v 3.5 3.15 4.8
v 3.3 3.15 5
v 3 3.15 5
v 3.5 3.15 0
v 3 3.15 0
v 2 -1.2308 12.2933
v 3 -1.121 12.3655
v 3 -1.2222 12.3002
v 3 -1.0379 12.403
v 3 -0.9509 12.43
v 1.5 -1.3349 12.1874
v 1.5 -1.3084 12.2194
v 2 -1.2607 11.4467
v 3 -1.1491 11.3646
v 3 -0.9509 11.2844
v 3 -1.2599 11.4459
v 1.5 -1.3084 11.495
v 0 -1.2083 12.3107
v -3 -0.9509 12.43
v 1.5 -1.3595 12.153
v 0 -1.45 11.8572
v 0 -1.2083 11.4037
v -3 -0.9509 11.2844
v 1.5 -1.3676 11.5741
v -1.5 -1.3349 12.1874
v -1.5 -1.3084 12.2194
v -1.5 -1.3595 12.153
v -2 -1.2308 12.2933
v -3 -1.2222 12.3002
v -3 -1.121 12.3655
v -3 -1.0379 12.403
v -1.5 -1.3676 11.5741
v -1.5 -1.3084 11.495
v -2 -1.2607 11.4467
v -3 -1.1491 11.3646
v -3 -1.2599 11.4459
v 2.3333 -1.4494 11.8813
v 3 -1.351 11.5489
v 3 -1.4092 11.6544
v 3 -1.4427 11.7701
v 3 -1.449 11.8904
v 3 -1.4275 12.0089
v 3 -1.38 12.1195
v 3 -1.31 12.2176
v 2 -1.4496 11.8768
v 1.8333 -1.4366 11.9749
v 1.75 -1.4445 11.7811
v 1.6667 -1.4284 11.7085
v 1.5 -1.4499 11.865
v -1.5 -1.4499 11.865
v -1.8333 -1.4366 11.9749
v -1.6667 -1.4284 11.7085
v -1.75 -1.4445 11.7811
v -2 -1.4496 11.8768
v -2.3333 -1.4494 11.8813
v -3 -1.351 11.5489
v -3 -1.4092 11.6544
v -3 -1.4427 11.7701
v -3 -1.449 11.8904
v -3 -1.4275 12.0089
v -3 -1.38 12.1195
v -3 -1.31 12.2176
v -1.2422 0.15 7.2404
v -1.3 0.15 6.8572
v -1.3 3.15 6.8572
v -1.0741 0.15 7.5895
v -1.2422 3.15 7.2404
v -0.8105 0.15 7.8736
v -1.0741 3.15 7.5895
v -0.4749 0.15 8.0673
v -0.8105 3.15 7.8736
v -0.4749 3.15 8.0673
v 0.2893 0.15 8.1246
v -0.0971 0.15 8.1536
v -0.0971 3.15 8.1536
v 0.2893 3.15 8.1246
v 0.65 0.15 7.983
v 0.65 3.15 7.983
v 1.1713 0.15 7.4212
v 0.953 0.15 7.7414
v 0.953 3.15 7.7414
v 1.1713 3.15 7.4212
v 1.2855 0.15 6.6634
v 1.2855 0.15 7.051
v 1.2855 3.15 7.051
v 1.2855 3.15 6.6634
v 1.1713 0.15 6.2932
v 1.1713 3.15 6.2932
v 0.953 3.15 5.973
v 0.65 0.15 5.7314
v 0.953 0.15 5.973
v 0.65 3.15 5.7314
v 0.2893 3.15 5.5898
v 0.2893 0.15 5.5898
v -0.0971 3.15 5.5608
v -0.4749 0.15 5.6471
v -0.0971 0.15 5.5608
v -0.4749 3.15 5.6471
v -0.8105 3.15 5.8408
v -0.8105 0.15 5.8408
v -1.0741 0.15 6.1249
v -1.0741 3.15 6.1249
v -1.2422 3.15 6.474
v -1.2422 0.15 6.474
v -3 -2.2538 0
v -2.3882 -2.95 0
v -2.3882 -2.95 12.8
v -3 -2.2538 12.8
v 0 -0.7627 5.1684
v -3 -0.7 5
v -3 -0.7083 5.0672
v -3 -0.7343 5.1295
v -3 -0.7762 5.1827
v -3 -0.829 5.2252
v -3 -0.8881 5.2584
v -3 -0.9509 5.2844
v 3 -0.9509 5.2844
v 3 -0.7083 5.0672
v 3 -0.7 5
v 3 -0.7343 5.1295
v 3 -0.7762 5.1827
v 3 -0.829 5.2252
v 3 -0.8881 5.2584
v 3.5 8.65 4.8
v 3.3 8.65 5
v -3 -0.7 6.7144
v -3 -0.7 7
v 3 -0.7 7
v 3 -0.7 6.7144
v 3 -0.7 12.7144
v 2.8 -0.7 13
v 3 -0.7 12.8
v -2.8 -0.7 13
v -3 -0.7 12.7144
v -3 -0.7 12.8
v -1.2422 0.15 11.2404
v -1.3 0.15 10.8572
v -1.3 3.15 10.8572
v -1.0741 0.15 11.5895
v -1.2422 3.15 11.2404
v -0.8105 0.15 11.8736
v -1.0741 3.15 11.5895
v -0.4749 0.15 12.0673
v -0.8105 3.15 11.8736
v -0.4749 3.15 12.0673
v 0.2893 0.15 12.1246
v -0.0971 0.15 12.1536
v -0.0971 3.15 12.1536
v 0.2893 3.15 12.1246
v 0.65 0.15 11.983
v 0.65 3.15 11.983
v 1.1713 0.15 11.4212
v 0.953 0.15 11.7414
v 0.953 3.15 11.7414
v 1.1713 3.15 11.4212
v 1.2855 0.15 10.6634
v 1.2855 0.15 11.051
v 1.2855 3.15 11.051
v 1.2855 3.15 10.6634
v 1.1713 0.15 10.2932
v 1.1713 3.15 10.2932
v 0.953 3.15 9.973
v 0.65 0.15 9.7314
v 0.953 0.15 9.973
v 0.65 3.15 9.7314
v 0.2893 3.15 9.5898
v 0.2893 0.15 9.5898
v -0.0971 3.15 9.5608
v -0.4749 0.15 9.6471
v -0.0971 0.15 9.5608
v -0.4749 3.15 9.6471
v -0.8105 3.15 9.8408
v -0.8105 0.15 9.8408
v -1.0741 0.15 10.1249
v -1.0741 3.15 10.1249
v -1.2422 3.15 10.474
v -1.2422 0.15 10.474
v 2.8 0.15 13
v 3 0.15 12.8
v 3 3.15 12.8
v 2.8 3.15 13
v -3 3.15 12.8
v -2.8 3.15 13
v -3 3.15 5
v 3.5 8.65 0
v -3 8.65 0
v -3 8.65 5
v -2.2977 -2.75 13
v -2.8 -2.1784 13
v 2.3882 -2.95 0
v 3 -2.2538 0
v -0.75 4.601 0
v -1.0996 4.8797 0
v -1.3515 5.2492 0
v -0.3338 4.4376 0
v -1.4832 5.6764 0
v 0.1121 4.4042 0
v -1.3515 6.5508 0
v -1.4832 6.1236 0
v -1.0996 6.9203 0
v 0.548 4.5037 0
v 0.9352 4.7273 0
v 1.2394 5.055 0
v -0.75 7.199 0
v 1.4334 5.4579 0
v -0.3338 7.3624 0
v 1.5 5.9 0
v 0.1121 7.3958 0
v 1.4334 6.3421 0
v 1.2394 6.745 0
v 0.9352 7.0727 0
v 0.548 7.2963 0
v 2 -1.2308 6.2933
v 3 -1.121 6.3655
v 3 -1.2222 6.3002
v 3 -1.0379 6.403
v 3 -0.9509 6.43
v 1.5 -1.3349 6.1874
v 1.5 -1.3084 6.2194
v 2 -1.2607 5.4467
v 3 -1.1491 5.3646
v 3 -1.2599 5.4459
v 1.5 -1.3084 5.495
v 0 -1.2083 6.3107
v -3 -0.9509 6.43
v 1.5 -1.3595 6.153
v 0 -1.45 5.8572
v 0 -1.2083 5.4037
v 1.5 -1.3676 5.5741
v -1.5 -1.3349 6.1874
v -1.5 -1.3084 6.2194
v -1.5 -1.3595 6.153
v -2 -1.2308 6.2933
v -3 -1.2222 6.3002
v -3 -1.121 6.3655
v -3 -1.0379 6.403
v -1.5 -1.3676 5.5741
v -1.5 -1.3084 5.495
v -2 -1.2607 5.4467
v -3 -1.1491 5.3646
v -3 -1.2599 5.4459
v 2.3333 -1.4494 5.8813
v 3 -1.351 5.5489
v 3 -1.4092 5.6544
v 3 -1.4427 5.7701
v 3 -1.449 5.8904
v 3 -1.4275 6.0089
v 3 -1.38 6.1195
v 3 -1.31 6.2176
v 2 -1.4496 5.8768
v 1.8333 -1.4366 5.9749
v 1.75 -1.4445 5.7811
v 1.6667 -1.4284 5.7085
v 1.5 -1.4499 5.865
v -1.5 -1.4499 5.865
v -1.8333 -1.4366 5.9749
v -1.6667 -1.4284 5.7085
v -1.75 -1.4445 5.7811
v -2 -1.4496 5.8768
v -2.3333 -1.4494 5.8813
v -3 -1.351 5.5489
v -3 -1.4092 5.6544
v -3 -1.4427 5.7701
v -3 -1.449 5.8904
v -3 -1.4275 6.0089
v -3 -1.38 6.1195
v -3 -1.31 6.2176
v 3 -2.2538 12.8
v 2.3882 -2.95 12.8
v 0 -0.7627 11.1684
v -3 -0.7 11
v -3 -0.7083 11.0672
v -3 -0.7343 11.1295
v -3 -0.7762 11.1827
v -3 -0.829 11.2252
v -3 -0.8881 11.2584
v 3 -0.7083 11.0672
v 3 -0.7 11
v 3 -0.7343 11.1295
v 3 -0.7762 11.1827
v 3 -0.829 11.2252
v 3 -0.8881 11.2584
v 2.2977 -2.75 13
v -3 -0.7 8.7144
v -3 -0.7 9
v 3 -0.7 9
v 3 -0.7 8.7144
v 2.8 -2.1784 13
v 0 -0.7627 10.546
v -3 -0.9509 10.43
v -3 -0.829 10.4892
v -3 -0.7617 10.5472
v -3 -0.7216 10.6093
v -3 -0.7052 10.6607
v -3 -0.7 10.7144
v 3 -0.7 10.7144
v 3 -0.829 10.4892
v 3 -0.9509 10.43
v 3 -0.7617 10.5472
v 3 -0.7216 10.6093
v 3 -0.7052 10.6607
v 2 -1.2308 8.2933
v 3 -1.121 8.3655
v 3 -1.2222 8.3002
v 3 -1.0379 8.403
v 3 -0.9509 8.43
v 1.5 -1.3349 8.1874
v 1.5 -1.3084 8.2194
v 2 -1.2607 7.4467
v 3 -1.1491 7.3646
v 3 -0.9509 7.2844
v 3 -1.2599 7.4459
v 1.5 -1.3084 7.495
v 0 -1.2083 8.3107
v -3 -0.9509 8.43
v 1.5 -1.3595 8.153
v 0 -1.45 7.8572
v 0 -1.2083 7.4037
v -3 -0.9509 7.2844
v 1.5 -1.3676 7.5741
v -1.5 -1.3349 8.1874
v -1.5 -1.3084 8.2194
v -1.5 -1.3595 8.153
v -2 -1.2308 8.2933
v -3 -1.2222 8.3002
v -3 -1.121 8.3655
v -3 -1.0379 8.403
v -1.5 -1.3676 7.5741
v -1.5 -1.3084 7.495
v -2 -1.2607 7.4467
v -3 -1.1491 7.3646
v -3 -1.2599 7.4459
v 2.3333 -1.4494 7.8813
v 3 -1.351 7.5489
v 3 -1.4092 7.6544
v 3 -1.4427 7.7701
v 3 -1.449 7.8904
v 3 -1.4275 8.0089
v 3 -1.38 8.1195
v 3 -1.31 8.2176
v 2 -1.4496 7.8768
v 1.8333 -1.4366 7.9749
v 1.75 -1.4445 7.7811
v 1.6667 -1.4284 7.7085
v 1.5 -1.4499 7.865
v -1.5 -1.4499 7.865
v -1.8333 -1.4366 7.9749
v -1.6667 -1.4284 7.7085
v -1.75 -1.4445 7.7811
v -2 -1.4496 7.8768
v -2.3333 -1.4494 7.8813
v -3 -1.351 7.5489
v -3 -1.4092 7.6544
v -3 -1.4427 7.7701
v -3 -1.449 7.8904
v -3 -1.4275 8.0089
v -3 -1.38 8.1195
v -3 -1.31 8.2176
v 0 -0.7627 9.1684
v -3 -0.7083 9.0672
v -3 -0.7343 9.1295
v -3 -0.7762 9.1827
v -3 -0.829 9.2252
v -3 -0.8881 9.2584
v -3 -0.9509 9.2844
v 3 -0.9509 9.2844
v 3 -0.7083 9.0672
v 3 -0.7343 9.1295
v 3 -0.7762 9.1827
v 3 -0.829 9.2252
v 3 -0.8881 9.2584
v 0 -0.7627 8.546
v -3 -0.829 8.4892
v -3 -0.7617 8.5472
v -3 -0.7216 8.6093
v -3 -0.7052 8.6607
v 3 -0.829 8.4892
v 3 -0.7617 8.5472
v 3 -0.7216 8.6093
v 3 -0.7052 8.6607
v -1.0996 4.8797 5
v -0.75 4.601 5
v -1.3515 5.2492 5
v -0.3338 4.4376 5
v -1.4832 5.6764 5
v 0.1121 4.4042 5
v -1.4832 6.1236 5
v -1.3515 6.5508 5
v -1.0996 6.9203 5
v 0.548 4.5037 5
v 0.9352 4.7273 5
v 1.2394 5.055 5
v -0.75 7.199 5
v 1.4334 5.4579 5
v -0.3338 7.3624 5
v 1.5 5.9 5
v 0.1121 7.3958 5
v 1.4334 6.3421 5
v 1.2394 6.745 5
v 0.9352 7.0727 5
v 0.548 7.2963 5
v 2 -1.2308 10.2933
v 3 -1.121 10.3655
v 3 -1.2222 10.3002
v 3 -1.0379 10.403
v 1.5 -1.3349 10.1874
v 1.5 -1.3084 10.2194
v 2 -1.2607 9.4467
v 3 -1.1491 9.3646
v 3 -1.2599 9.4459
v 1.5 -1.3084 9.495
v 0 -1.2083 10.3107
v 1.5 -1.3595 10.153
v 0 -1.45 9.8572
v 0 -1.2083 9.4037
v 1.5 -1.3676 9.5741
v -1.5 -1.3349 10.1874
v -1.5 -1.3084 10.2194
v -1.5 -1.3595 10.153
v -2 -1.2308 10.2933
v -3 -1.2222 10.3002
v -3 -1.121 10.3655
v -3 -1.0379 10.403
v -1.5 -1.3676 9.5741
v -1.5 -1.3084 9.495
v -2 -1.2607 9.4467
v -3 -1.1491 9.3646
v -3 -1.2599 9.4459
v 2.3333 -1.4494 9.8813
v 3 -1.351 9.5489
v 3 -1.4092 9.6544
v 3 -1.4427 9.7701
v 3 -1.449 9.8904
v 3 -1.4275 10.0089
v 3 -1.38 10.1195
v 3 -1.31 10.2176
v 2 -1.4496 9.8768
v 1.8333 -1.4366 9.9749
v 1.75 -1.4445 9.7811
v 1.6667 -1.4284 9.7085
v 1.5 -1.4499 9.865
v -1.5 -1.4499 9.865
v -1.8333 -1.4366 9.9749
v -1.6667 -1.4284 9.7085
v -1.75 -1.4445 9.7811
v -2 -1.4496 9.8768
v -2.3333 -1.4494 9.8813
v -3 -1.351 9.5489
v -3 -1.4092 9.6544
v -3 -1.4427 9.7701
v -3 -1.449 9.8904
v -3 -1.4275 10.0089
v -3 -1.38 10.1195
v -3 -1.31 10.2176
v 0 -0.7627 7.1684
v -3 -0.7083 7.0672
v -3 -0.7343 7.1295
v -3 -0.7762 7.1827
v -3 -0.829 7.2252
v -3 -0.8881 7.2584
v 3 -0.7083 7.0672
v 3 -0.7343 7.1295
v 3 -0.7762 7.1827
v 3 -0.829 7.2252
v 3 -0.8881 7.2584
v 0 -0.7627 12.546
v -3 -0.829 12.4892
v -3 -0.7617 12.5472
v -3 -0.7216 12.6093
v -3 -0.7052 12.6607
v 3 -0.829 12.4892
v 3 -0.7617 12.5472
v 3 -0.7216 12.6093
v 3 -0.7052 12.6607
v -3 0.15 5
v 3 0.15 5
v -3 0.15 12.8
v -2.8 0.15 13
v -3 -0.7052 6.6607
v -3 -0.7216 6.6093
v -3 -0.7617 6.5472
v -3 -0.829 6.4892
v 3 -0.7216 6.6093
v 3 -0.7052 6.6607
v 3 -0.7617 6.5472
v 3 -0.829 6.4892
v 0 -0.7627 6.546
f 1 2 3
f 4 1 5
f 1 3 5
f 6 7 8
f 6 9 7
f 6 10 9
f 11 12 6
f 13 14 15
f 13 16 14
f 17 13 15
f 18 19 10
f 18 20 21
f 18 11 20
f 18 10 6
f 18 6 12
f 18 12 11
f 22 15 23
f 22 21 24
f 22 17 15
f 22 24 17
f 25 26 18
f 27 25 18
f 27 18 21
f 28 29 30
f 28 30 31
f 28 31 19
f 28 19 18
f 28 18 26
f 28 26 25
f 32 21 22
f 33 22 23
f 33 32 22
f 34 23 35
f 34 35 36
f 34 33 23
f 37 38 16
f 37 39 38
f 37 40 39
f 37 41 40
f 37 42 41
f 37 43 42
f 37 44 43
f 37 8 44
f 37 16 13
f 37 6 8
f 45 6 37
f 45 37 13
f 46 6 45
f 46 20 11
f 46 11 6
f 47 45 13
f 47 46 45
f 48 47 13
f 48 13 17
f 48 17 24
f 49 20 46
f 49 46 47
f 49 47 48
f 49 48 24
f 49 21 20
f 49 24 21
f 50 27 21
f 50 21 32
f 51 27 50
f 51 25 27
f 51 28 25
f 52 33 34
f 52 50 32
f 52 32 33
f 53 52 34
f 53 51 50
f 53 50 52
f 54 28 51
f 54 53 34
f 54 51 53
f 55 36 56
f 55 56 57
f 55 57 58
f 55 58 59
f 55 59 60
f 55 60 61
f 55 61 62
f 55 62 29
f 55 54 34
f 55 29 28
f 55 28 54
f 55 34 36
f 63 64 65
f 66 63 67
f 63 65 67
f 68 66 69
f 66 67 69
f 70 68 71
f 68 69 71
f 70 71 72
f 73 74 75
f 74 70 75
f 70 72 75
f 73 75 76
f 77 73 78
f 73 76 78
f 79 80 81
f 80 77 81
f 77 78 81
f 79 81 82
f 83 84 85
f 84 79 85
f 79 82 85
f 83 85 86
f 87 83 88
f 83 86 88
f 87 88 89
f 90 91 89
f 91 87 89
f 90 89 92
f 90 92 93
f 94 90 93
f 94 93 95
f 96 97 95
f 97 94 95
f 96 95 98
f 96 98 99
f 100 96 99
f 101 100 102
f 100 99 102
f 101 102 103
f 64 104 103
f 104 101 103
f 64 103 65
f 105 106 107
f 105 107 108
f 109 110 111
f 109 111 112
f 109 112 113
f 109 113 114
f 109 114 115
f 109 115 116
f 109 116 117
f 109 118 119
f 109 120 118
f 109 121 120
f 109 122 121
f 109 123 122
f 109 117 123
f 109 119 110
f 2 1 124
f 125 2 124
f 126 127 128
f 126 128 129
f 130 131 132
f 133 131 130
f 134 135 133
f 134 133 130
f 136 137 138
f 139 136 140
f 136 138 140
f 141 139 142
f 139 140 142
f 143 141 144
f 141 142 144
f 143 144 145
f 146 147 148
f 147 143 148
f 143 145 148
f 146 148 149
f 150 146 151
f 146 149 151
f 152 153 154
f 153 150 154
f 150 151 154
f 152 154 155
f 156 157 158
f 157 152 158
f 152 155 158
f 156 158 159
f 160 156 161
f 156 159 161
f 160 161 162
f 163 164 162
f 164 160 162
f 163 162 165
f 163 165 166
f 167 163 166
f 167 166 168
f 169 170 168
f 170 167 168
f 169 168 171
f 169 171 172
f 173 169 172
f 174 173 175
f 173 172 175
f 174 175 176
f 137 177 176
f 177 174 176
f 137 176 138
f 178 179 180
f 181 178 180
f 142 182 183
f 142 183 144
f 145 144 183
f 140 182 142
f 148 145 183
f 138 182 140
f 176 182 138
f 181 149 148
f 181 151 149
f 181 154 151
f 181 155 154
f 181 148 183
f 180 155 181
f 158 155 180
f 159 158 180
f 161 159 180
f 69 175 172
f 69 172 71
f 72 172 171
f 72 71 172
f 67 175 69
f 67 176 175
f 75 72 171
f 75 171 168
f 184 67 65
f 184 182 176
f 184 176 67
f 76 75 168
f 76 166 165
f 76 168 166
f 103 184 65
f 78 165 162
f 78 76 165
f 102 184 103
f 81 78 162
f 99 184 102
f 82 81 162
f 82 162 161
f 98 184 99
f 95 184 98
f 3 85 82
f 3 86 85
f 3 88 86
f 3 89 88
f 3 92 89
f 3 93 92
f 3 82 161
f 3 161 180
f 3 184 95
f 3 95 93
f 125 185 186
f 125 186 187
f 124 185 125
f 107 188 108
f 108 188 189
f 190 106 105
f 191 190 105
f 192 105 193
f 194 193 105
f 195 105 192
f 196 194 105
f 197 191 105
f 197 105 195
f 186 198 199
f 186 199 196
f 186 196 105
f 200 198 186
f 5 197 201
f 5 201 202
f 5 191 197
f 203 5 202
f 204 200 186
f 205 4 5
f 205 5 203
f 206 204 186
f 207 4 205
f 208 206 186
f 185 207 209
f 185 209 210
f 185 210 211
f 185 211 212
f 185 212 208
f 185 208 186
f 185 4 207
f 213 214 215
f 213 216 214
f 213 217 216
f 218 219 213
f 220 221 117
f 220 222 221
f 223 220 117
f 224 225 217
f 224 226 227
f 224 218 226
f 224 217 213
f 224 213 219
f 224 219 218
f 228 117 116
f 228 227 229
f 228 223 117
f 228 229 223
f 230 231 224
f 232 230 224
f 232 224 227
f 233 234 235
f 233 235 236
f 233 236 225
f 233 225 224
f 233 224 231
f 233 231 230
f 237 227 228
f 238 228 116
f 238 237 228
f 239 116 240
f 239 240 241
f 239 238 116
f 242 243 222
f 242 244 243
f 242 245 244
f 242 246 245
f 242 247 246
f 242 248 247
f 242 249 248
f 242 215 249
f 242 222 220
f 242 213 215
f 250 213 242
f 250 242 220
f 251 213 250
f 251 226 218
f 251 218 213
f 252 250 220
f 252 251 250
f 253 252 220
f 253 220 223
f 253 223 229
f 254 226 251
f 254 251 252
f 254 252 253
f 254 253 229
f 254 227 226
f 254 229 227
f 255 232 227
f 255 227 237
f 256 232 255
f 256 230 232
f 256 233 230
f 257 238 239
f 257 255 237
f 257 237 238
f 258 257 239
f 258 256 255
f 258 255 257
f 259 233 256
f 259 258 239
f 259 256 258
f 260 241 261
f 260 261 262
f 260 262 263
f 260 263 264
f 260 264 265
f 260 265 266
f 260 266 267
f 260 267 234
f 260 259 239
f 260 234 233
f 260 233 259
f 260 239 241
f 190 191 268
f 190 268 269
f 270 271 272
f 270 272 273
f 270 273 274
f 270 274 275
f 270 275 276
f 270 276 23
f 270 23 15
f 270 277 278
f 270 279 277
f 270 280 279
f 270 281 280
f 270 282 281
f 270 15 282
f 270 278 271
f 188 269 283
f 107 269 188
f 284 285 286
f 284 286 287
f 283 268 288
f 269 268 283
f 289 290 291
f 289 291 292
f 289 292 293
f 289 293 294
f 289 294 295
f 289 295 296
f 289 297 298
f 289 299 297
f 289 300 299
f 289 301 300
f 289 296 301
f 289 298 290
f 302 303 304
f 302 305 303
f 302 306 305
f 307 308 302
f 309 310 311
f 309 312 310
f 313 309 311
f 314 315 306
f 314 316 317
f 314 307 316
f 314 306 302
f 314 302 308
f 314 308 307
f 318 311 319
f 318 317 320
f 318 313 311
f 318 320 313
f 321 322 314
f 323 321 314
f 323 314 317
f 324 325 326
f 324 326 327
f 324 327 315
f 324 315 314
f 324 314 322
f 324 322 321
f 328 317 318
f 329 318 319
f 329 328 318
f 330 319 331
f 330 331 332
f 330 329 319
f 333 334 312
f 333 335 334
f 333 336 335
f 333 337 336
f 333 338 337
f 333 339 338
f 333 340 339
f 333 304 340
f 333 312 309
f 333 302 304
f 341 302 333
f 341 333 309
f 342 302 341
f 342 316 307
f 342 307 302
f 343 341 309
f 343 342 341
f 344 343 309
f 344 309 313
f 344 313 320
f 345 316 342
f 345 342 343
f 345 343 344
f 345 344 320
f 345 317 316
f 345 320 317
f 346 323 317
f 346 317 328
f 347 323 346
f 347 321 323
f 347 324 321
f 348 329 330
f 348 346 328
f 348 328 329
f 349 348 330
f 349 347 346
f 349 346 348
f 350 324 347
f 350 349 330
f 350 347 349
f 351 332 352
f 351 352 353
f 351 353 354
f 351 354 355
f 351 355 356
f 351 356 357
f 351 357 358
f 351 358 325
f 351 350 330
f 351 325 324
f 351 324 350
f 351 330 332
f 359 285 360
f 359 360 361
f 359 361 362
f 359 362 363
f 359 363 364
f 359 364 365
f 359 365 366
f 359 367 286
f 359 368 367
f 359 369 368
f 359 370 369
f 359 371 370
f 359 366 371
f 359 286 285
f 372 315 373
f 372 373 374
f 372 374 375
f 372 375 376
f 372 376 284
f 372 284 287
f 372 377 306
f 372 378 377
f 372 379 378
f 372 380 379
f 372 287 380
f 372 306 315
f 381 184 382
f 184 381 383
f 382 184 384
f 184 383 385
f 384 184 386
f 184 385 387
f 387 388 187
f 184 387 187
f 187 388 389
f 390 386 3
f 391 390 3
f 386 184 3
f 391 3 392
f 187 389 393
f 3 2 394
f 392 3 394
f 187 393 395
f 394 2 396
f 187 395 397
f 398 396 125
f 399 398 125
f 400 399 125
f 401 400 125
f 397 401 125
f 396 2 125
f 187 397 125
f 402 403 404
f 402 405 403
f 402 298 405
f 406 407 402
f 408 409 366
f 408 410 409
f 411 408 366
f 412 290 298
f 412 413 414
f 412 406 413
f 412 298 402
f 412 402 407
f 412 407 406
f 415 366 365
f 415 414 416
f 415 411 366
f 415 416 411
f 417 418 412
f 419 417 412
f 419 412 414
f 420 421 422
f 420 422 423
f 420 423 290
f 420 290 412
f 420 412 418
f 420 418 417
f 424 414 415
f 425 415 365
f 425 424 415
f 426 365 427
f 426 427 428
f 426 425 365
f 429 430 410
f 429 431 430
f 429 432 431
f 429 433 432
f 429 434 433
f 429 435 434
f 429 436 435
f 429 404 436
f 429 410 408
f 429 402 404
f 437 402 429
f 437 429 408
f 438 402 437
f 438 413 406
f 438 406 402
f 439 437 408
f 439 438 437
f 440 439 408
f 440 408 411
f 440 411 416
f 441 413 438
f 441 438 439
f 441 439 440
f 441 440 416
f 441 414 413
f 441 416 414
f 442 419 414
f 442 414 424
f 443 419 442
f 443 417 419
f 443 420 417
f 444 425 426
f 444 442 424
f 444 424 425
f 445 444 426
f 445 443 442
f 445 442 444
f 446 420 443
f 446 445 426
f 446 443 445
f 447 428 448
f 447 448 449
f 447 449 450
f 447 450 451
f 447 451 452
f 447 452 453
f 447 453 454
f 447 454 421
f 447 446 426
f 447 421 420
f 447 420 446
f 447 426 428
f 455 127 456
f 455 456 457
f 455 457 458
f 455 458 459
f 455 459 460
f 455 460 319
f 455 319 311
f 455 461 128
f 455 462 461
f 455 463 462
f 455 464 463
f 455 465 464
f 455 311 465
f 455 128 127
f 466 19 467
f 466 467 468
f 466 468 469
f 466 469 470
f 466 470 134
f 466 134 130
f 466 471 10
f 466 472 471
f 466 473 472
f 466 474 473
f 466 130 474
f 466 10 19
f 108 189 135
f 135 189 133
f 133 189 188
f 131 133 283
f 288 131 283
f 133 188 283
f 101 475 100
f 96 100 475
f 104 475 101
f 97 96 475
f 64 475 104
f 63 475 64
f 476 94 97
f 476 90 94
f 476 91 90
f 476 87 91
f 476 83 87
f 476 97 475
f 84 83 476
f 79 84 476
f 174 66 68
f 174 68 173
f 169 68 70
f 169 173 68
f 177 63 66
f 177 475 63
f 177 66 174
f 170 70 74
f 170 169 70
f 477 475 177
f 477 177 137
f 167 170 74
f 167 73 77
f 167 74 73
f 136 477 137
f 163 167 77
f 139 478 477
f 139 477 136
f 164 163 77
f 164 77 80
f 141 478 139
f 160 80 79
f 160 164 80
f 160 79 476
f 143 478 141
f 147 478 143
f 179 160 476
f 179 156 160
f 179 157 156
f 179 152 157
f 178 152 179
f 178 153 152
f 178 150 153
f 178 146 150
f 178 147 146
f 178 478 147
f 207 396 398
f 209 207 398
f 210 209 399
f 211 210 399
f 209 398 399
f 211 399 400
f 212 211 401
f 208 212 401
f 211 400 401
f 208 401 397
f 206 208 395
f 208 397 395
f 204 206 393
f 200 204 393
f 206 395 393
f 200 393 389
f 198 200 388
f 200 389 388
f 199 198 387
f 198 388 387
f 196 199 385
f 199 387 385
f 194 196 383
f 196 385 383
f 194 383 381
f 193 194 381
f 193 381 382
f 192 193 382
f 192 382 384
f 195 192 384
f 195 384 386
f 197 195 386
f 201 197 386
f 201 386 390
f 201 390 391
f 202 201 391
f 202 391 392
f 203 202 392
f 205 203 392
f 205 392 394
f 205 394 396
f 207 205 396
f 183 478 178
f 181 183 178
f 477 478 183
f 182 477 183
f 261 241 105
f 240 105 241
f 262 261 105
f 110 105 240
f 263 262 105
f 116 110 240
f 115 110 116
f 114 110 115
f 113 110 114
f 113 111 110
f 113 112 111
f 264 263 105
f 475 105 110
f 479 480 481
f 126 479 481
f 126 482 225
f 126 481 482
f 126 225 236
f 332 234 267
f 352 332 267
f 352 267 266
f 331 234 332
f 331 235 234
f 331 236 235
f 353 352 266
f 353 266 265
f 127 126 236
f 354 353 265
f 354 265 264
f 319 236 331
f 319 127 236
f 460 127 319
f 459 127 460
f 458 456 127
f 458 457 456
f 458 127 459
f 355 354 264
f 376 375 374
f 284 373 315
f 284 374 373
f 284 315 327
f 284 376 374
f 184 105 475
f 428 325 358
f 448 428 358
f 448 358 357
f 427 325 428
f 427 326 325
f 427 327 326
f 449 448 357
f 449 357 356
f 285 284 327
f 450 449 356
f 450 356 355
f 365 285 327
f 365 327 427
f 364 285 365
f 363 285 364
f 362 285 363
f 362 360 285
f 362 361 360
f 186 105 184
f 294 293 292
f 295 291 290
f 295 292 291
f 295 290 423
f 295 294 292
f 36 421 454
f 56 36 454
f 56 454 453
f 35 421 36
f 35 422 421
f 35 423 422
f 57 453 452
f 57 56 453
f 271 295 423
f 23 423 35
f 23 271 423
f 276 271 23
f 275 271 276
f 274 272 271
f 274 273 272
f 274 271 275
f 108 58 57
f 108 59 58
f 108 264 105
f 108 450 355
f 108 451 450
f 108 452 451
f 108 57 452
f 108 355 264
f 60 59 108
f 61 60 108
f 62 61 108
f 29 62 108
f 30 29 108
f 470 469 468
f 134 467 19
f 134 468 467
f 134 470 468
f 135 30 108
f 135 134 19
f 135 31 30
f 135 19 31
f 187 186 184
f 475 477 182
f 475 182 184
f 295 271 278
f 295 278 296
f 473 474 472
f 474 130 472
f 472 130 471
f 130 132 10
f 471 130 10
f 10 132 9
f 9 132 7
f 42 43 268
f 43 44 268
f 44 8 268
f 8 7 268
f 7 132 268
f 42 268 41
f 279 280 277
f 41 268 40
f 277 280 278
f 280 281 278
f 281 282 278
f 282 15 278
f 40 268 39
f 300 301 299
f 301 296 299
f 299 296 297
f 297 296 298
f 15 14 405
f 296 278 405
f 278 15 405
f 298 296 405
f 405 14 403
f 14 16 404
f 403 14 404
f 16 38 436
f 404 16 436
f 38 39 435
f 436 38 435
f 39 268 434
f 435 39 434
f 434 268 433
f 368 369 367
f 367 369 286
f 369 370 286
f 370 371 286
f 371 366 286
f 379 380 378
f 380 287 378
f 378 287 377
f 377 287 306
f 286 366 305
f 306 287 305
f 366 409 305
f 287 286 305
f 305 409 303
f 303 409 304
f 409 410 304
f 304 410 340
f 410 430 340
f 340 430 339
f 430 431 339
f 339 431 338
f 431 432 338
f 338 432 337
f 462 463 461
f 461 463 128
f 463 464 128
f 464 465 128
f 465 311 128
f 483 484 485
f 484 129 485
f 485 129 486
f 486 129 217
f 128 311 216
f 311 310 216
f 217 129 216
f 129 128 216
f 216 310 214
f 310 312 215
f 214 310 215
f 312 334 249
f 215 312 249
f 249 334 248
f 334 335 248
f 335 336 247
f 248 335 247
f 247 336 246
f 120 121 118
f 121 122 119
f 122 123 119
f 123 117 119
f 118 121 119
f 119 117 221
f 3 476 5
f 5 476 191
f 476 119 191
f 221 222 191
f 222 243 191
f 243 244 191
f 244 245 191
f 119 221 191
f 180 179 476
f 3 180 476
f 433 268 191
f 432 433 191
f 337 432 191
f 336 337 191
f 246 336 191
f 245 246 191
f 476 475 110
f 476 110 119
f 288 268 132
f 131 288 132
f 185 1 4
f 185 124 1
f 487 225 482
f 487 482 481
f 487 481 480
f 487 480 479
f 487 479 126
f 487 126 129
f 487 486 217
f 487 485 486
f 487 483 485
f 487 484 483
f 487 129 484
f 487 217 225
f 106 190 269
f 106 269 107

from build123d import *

# Parameters (mm, degrees)
BOSS_EXTRUDE1_DEPTH     = 13
SKETCH6_W               = 6
SKETCH6_H               = 5
BOSS_EXTRUDE4_DEPTH     = 5.6
SKETCH16_W              = 6
SKETCH16_H              = 8
BOSS_EXTRUDE5_DEPTH     = 0.1
CUT_EXTRUDE6_DEPTH      = 4
CUT_EXTRUDE6_DEPTH_BACK = 3.6
SKETCH15_R              = 1.3
CUT_EXTRUDE7_DEPTH      = 8.7202
CUT_EXTRUDE8_START      = -0.2202
SKETCH19_W              = 6
SKETCH19_H              = 8
SKETCH19_R              = 1.3
CUT_EXTRUDE8_DEPTH      = 0.2202
SKETCH12_R              = 1.5
CUT_EXTRUDE5_DEPTH      = 6
CHAMFER1_SIZE           = 0.2
SKETCH20_W              = 5
SKETCH20_H              = 5.5
BOSS_EXTRUDE6_DEPTH     = 0.5
SKETCH21_W              = 5
SKETCH21_H              = 5.5
BOSS_EXTRUDE7_DEPTH     = 0.5
CHAMFER2_SIZE           = 0.2
CROQUIS1_W              = 5
CROQUIS1_H              = 5.5
CORTAR_EXTRUIR1_DEPTH   = 0.5


with BuildPart() as part:
    # Sketch1 → Boss-Extrude1 (new body)
    with BuildSketch(Plane.XY):
        Polygon((3, 3.05), (3, -2.253801214), (2.388188946, -2.95), (-2.388188946, -2.95), (-3, -2.253801214), (-3, 3.05), align=None)
    extrude(amount=BOSS_EXTRUDE1_DEPTH)

    # Sketch6 → Boss-Extrude4 (add)
    with BuildSketch(Plane(origin=(0, 3.05, 0), x_dir=(1, 0, 0), z_dir=(0, 1, 0))):
        with Locations((0, -2.5)):
            Rectangle(SKETCH6_W, SKETCH6_H)
    extrude(amount=BOSS_EXTRUDE4_DEPTH)

    # Sketch16 → Boss-Extrude5 (add)
    with BuildSketch(Plane(origin=(0, 3.05, 0), x_dir=(1, 0, 0), z_dir=(0, 1, 0))):
        with Locations((0, -9)):
            Rectangle(SKETCH16_W, SKETCH16_H)
    extrude(amount=BOSS_EXTRUDE5_DEPTH)

    # Sketch18 → Cut-Extrude6 (cut, two sides: drawn at the far end of the back side and taken through both)
    with BuildSketch(Plane(origin=(0, 0, 0), x_dir=(0, 0, -1), z_dir=(1, 0, 0)).offset(-CUT_EXTRUDE6_DEPTH_BACK)):
        with BuildLine():
            Line((-8.8572, -0.0702), (-12.8572, -0.0702))
            Line((-12.8572, -0.0702), (-13, -0.0702))
            Line((-13, -0.0702), (-13, -0.7))
            Line((-13, -0.7), (-12.8572, -0.7))
            Line((-12.8572, -0.7), (-12.7144, -0.7))
            add(Edge.make_bspline(
                [(-12.7144, -0.7), (-12.5198, -0.7), (-12.43, -0.9509)],
                knots=[0.103448276, 0.103448276, 0.103448276, 0.137931034, 0.137931034, 0.137931034], degree=2))
            add(Edge.make_bspline(
                [(-12.43, -0.9509), (-12.3594, -1.2388), (-12.13, -1.45), (-11.8572, -1.45)],
                knots=[0.137931034, 0.137931034, 0.137931034, 0.137931034, 0.172413793, 0.172413793, 0.172413793, 0.172413793], degree=3))
            add(Edge.make_bspline(
                [(-11.8572, -1.45), (-11.5844, -1.45), (-11.355, -1.2388), (-11.2844, -0.9509)],
                knots=[0.172413793, 0.172413793, 0.172413793, 0.172413793, 0.206896552, 0.206896552, 0.206896552, 0.206896552], degree=3))
            add(Edge.make_bspline(
                [(-11.2844, -0.9509), (-11.1946, -0.7), (-11, -0.7)],
                knots=[0.206896552, 0.206896552, 0.206896552, 0.24137931, 0.24137931, 0.24137931], degree=2))
            Line((-11, -0.7), (-10.8572, -0.7))
            Line((-10.8572, -0.7), (-10.7144, -0.7))
            add(Edge.make_bspline(
                [(-10.7144, -0.7), (-10.5198, -0.7), (-10.43, -0.9509)],
                knots=[0.310344828, 0.310344828, 0.310344828, 0.344827586, 0.344827586, 0.344827586], degree=2))
            add(Edge.make_bspline(
                [(-10.43, -0.9509), (-10.3594, -1.2388), (-10.13, -1.45), (-9.8572, -1.45)],
                knots=[0.344827586, 0.344827586, 0.344827586, 0.344827586, 0.379310345, 0.379310345, 0.379310345, 0.379310345], degree=3))
            add(Edge.make_bspline(
                [(-9.8572, -1.45), (-9.5844, -1.45), (-9.355, -1.2388), (-9.2844, -0.9509)],
                knots=[0.379310345, 0.379310345, 0.379310345, 0.379310345, 0.413793103, 0.413793103, 0.413793103, 0.413793103], degree=3))
            add(Edge.make_bspline(
                [(-9.2844, -0.9509), (-9.1946, -0.7), (-9, -0.7)],
                knots=[0.413793103, 0.413793103, 0.413793103, 0.448275862, 0.448275862, 0.448275862], degree=2))
            Line((-9, -0.7), (-8.8572, -0.7))
            Line((-8.8572, -0.7), (-8.7144, -0.7))
            add(Edge.make_bspline(
                [(-8.7144, -0.7), (-8.5198, -0.7), (-8.43, -0.9509)],
                knots=[0.517241379, 0.517241379, 0.517241379, 0.551724138, 0.551724138, 0.551724138], degree=2))
            add(Edge.make_bspline(
                [(-8.43, -0.9509), (-8.3594, -1.2388), (-8.13, -1.45), (-7.8572, -1.45)],
                knots=[0.551724138, 0.551724138, 0.551724138, 0.551724138, 0.586206897, 0.586206897, 0.586206897, 0.586206897], degree=3))
            add(Edge.make_bspline(
                [(-7.8572, -1.45), (-7.5844, -1.45), (-7.355, -1.2388), (-7.2844, -0.9509)],
                knots=[0.586206897, 0.586206897, 0.586206897, 0.586206897, 0.620689655, 0.620689655, 0.620689655, 0.620689655], degree=3))
            add(Edge.make_bspline(
                [(-7.2844, -0.9509), (-7.1946, -0.7), (-7, -0.7)],
                knots=[0.620689655, 0.620689655, 0.620689655, 0.655172414, 0.655172414, 0.655172414], degree=2))
            Line((-7, -0.7), (-6.8572, -0.7))
            Line((-6.8572, -0.7), (-6.7144, -0.7))
            add(Edge.make_bspline(
                [(-6.7144, -0.7), (-6.5198, -0.7), (-6.43, -0.9509)],
                knots=[0.724137931, 0.724137931, 0.724137931, 0.75862069, 0.75862069, 0.75862069], degree=2))
            add(Edge.make_bspline(
                [(-6.43, -0.9509), (-6.3594, -1.2388), (-6.13, -1.45), (-5.8572, -1.45)],
                knots=[0.75862069, 0.75862069, 0.75862069, 0.75862069, 0.793103448, 0.793103448, 0.793103448, 0.793103448], degree=3))
            add(Edge.make_bspline(
                [(-5.8572, -1.45), (-5.5844, -1.45), (-5.355, -1.2388), (-5.2844, -0.9509)],
                knots=[0.793103448, 0.793103448, 0.793103448, 0.793103448, 0.827586207, 0.827586207, 0.827586207, 0.827586207], degree=3))
            add(Edge.make_bspline(
                [(-5.2844, -0.9509), (-5.1946, -0.7), (-5, -0.7)],
                knots=[0.827586207, 0.827586207, 0.827586207, 0.862068966, 0.862068966, 0.862068966], degree=2))
            Line((-5, -0.7), (-5, -0.0702))
            Line((-5, -0.0702), (-8.8572, -0.0702))
        make_face()
    extrude(amount=CUT_EXTRUDE6_DEPTH + CUT_EXTRUDE6_DEPTH_BACK, mode=Mode.SUBTRACT)

    # Sketch15 → Cut-Extrude7 (cut)
    with BuildSketch(Plane(origin=(0, 8.65, 0), x_dir=(1, 0, 0), z_dir=(0, 1, 0))):
        with Locations(Location((0, -10.8572, 0), (0, 0, 180))):
            Circle(SKETCH15_R)
        with Locations(Location((0, -6.8572, 0), (0, 0, 180))):
            Circle(SKETCH15_R)
    extrude(amount=-CUT_EXTRUDE7_DEPTH, mode=Mode.SUBTRACT)

    # Sketch19 → Cut-Extrude8 (cut)
    with BuildSketch(Plane.XZ.offset(0.0702).offset(CUT_EXTRUDE8_START)):
        with Locations((0, 9)):
            Rectangle(SKETCH19_W, SKETCH19_H)
        with Locations(Location((0, 10.8572, 0), (0, 0, 180))):
            Circle(SKETCH19_R, mode=Mode.SUBTRACT)
        with Locations(Location((0, 6.8572, 0), (0, 0, 180))):
            Circle(SKETCH19_R, mode=Mode.SUBTRACT)
    extrude(amount=CUT_EXTRUDE8_DEPTH, mode=Mode.SUBTRACT)

    # Sketch12 → Cut-Extrude5 (cut)
    with BuildSketch(Plane.XY.offset(5)):
        with Locations((0, 5.9)):
            Circle(SKETCH12_R)
    extrude(amount=-CUT_EXTRUDE5_DEPTH, mode=Mode.SUBTRACT)

    # Chamfer1
    chamfer1_edges = [part.edges().sort_by_distance(p)[0] for p in [
        (-2.694094473, -2.601900607, 13),
        (0, -2.95, 13),
        (2.694094473, -2.601900607, 13),
        (3, 1.65, 13),
        (3, -1.476900607, 13),
        (-3, -1.476900607, 13),
        (-3, 1.65, 13),
    ]]
    chamfer(chamfer1_edges, length=CHAMFER1_SIZE)

    # Sketch20 → Boss-Extrude6 (add)
    with BuildSketch(Plane(origin=(3, 0, 0), x_dir=(0, 0, -1), z_dir=(1, 0, 0))):
        with Locations((-2.5, 5.9)):
            Rectangle(SKETCH20_W, SKETCH20_H)
    extrude(amount=BOSS_EXTRUDE6_DEPTH)

    # Sketch21 → Boss-Extrude7 (add)
    with BuildSketch(Plane.ZY.offset(3)):
        with Locations((2.5, 5.9)):
            Rectangle(SKETCH21_W, SKETCH21_H)
    extrude(amount=BOSS_EXTRUDE7_DEPTH)

    # Chamfer2
    chamfer2_edges = [part.edges().sort_by_distance(p)[0] for p in [
        (3.5, 5.9, 5),
        (-3.5, 5.9, 5),
    ]]
    chamfer(chamfer2_edges, length=CHAMFER2_SIZE)

    # Croquis1 → Cortar-Extruir1 (cut)
    with BuildSketch(Plane.ZY.offset(3.5)):
        with Locations((2.5, 5.9)):
            Rectangle(CROQUIS1_W, CROQUIS1_H)
    extrude(amount=-CORTAR_EXTRUIR1_DEPTH, mode=Mode.SUBTRACT)


solid = part.part
